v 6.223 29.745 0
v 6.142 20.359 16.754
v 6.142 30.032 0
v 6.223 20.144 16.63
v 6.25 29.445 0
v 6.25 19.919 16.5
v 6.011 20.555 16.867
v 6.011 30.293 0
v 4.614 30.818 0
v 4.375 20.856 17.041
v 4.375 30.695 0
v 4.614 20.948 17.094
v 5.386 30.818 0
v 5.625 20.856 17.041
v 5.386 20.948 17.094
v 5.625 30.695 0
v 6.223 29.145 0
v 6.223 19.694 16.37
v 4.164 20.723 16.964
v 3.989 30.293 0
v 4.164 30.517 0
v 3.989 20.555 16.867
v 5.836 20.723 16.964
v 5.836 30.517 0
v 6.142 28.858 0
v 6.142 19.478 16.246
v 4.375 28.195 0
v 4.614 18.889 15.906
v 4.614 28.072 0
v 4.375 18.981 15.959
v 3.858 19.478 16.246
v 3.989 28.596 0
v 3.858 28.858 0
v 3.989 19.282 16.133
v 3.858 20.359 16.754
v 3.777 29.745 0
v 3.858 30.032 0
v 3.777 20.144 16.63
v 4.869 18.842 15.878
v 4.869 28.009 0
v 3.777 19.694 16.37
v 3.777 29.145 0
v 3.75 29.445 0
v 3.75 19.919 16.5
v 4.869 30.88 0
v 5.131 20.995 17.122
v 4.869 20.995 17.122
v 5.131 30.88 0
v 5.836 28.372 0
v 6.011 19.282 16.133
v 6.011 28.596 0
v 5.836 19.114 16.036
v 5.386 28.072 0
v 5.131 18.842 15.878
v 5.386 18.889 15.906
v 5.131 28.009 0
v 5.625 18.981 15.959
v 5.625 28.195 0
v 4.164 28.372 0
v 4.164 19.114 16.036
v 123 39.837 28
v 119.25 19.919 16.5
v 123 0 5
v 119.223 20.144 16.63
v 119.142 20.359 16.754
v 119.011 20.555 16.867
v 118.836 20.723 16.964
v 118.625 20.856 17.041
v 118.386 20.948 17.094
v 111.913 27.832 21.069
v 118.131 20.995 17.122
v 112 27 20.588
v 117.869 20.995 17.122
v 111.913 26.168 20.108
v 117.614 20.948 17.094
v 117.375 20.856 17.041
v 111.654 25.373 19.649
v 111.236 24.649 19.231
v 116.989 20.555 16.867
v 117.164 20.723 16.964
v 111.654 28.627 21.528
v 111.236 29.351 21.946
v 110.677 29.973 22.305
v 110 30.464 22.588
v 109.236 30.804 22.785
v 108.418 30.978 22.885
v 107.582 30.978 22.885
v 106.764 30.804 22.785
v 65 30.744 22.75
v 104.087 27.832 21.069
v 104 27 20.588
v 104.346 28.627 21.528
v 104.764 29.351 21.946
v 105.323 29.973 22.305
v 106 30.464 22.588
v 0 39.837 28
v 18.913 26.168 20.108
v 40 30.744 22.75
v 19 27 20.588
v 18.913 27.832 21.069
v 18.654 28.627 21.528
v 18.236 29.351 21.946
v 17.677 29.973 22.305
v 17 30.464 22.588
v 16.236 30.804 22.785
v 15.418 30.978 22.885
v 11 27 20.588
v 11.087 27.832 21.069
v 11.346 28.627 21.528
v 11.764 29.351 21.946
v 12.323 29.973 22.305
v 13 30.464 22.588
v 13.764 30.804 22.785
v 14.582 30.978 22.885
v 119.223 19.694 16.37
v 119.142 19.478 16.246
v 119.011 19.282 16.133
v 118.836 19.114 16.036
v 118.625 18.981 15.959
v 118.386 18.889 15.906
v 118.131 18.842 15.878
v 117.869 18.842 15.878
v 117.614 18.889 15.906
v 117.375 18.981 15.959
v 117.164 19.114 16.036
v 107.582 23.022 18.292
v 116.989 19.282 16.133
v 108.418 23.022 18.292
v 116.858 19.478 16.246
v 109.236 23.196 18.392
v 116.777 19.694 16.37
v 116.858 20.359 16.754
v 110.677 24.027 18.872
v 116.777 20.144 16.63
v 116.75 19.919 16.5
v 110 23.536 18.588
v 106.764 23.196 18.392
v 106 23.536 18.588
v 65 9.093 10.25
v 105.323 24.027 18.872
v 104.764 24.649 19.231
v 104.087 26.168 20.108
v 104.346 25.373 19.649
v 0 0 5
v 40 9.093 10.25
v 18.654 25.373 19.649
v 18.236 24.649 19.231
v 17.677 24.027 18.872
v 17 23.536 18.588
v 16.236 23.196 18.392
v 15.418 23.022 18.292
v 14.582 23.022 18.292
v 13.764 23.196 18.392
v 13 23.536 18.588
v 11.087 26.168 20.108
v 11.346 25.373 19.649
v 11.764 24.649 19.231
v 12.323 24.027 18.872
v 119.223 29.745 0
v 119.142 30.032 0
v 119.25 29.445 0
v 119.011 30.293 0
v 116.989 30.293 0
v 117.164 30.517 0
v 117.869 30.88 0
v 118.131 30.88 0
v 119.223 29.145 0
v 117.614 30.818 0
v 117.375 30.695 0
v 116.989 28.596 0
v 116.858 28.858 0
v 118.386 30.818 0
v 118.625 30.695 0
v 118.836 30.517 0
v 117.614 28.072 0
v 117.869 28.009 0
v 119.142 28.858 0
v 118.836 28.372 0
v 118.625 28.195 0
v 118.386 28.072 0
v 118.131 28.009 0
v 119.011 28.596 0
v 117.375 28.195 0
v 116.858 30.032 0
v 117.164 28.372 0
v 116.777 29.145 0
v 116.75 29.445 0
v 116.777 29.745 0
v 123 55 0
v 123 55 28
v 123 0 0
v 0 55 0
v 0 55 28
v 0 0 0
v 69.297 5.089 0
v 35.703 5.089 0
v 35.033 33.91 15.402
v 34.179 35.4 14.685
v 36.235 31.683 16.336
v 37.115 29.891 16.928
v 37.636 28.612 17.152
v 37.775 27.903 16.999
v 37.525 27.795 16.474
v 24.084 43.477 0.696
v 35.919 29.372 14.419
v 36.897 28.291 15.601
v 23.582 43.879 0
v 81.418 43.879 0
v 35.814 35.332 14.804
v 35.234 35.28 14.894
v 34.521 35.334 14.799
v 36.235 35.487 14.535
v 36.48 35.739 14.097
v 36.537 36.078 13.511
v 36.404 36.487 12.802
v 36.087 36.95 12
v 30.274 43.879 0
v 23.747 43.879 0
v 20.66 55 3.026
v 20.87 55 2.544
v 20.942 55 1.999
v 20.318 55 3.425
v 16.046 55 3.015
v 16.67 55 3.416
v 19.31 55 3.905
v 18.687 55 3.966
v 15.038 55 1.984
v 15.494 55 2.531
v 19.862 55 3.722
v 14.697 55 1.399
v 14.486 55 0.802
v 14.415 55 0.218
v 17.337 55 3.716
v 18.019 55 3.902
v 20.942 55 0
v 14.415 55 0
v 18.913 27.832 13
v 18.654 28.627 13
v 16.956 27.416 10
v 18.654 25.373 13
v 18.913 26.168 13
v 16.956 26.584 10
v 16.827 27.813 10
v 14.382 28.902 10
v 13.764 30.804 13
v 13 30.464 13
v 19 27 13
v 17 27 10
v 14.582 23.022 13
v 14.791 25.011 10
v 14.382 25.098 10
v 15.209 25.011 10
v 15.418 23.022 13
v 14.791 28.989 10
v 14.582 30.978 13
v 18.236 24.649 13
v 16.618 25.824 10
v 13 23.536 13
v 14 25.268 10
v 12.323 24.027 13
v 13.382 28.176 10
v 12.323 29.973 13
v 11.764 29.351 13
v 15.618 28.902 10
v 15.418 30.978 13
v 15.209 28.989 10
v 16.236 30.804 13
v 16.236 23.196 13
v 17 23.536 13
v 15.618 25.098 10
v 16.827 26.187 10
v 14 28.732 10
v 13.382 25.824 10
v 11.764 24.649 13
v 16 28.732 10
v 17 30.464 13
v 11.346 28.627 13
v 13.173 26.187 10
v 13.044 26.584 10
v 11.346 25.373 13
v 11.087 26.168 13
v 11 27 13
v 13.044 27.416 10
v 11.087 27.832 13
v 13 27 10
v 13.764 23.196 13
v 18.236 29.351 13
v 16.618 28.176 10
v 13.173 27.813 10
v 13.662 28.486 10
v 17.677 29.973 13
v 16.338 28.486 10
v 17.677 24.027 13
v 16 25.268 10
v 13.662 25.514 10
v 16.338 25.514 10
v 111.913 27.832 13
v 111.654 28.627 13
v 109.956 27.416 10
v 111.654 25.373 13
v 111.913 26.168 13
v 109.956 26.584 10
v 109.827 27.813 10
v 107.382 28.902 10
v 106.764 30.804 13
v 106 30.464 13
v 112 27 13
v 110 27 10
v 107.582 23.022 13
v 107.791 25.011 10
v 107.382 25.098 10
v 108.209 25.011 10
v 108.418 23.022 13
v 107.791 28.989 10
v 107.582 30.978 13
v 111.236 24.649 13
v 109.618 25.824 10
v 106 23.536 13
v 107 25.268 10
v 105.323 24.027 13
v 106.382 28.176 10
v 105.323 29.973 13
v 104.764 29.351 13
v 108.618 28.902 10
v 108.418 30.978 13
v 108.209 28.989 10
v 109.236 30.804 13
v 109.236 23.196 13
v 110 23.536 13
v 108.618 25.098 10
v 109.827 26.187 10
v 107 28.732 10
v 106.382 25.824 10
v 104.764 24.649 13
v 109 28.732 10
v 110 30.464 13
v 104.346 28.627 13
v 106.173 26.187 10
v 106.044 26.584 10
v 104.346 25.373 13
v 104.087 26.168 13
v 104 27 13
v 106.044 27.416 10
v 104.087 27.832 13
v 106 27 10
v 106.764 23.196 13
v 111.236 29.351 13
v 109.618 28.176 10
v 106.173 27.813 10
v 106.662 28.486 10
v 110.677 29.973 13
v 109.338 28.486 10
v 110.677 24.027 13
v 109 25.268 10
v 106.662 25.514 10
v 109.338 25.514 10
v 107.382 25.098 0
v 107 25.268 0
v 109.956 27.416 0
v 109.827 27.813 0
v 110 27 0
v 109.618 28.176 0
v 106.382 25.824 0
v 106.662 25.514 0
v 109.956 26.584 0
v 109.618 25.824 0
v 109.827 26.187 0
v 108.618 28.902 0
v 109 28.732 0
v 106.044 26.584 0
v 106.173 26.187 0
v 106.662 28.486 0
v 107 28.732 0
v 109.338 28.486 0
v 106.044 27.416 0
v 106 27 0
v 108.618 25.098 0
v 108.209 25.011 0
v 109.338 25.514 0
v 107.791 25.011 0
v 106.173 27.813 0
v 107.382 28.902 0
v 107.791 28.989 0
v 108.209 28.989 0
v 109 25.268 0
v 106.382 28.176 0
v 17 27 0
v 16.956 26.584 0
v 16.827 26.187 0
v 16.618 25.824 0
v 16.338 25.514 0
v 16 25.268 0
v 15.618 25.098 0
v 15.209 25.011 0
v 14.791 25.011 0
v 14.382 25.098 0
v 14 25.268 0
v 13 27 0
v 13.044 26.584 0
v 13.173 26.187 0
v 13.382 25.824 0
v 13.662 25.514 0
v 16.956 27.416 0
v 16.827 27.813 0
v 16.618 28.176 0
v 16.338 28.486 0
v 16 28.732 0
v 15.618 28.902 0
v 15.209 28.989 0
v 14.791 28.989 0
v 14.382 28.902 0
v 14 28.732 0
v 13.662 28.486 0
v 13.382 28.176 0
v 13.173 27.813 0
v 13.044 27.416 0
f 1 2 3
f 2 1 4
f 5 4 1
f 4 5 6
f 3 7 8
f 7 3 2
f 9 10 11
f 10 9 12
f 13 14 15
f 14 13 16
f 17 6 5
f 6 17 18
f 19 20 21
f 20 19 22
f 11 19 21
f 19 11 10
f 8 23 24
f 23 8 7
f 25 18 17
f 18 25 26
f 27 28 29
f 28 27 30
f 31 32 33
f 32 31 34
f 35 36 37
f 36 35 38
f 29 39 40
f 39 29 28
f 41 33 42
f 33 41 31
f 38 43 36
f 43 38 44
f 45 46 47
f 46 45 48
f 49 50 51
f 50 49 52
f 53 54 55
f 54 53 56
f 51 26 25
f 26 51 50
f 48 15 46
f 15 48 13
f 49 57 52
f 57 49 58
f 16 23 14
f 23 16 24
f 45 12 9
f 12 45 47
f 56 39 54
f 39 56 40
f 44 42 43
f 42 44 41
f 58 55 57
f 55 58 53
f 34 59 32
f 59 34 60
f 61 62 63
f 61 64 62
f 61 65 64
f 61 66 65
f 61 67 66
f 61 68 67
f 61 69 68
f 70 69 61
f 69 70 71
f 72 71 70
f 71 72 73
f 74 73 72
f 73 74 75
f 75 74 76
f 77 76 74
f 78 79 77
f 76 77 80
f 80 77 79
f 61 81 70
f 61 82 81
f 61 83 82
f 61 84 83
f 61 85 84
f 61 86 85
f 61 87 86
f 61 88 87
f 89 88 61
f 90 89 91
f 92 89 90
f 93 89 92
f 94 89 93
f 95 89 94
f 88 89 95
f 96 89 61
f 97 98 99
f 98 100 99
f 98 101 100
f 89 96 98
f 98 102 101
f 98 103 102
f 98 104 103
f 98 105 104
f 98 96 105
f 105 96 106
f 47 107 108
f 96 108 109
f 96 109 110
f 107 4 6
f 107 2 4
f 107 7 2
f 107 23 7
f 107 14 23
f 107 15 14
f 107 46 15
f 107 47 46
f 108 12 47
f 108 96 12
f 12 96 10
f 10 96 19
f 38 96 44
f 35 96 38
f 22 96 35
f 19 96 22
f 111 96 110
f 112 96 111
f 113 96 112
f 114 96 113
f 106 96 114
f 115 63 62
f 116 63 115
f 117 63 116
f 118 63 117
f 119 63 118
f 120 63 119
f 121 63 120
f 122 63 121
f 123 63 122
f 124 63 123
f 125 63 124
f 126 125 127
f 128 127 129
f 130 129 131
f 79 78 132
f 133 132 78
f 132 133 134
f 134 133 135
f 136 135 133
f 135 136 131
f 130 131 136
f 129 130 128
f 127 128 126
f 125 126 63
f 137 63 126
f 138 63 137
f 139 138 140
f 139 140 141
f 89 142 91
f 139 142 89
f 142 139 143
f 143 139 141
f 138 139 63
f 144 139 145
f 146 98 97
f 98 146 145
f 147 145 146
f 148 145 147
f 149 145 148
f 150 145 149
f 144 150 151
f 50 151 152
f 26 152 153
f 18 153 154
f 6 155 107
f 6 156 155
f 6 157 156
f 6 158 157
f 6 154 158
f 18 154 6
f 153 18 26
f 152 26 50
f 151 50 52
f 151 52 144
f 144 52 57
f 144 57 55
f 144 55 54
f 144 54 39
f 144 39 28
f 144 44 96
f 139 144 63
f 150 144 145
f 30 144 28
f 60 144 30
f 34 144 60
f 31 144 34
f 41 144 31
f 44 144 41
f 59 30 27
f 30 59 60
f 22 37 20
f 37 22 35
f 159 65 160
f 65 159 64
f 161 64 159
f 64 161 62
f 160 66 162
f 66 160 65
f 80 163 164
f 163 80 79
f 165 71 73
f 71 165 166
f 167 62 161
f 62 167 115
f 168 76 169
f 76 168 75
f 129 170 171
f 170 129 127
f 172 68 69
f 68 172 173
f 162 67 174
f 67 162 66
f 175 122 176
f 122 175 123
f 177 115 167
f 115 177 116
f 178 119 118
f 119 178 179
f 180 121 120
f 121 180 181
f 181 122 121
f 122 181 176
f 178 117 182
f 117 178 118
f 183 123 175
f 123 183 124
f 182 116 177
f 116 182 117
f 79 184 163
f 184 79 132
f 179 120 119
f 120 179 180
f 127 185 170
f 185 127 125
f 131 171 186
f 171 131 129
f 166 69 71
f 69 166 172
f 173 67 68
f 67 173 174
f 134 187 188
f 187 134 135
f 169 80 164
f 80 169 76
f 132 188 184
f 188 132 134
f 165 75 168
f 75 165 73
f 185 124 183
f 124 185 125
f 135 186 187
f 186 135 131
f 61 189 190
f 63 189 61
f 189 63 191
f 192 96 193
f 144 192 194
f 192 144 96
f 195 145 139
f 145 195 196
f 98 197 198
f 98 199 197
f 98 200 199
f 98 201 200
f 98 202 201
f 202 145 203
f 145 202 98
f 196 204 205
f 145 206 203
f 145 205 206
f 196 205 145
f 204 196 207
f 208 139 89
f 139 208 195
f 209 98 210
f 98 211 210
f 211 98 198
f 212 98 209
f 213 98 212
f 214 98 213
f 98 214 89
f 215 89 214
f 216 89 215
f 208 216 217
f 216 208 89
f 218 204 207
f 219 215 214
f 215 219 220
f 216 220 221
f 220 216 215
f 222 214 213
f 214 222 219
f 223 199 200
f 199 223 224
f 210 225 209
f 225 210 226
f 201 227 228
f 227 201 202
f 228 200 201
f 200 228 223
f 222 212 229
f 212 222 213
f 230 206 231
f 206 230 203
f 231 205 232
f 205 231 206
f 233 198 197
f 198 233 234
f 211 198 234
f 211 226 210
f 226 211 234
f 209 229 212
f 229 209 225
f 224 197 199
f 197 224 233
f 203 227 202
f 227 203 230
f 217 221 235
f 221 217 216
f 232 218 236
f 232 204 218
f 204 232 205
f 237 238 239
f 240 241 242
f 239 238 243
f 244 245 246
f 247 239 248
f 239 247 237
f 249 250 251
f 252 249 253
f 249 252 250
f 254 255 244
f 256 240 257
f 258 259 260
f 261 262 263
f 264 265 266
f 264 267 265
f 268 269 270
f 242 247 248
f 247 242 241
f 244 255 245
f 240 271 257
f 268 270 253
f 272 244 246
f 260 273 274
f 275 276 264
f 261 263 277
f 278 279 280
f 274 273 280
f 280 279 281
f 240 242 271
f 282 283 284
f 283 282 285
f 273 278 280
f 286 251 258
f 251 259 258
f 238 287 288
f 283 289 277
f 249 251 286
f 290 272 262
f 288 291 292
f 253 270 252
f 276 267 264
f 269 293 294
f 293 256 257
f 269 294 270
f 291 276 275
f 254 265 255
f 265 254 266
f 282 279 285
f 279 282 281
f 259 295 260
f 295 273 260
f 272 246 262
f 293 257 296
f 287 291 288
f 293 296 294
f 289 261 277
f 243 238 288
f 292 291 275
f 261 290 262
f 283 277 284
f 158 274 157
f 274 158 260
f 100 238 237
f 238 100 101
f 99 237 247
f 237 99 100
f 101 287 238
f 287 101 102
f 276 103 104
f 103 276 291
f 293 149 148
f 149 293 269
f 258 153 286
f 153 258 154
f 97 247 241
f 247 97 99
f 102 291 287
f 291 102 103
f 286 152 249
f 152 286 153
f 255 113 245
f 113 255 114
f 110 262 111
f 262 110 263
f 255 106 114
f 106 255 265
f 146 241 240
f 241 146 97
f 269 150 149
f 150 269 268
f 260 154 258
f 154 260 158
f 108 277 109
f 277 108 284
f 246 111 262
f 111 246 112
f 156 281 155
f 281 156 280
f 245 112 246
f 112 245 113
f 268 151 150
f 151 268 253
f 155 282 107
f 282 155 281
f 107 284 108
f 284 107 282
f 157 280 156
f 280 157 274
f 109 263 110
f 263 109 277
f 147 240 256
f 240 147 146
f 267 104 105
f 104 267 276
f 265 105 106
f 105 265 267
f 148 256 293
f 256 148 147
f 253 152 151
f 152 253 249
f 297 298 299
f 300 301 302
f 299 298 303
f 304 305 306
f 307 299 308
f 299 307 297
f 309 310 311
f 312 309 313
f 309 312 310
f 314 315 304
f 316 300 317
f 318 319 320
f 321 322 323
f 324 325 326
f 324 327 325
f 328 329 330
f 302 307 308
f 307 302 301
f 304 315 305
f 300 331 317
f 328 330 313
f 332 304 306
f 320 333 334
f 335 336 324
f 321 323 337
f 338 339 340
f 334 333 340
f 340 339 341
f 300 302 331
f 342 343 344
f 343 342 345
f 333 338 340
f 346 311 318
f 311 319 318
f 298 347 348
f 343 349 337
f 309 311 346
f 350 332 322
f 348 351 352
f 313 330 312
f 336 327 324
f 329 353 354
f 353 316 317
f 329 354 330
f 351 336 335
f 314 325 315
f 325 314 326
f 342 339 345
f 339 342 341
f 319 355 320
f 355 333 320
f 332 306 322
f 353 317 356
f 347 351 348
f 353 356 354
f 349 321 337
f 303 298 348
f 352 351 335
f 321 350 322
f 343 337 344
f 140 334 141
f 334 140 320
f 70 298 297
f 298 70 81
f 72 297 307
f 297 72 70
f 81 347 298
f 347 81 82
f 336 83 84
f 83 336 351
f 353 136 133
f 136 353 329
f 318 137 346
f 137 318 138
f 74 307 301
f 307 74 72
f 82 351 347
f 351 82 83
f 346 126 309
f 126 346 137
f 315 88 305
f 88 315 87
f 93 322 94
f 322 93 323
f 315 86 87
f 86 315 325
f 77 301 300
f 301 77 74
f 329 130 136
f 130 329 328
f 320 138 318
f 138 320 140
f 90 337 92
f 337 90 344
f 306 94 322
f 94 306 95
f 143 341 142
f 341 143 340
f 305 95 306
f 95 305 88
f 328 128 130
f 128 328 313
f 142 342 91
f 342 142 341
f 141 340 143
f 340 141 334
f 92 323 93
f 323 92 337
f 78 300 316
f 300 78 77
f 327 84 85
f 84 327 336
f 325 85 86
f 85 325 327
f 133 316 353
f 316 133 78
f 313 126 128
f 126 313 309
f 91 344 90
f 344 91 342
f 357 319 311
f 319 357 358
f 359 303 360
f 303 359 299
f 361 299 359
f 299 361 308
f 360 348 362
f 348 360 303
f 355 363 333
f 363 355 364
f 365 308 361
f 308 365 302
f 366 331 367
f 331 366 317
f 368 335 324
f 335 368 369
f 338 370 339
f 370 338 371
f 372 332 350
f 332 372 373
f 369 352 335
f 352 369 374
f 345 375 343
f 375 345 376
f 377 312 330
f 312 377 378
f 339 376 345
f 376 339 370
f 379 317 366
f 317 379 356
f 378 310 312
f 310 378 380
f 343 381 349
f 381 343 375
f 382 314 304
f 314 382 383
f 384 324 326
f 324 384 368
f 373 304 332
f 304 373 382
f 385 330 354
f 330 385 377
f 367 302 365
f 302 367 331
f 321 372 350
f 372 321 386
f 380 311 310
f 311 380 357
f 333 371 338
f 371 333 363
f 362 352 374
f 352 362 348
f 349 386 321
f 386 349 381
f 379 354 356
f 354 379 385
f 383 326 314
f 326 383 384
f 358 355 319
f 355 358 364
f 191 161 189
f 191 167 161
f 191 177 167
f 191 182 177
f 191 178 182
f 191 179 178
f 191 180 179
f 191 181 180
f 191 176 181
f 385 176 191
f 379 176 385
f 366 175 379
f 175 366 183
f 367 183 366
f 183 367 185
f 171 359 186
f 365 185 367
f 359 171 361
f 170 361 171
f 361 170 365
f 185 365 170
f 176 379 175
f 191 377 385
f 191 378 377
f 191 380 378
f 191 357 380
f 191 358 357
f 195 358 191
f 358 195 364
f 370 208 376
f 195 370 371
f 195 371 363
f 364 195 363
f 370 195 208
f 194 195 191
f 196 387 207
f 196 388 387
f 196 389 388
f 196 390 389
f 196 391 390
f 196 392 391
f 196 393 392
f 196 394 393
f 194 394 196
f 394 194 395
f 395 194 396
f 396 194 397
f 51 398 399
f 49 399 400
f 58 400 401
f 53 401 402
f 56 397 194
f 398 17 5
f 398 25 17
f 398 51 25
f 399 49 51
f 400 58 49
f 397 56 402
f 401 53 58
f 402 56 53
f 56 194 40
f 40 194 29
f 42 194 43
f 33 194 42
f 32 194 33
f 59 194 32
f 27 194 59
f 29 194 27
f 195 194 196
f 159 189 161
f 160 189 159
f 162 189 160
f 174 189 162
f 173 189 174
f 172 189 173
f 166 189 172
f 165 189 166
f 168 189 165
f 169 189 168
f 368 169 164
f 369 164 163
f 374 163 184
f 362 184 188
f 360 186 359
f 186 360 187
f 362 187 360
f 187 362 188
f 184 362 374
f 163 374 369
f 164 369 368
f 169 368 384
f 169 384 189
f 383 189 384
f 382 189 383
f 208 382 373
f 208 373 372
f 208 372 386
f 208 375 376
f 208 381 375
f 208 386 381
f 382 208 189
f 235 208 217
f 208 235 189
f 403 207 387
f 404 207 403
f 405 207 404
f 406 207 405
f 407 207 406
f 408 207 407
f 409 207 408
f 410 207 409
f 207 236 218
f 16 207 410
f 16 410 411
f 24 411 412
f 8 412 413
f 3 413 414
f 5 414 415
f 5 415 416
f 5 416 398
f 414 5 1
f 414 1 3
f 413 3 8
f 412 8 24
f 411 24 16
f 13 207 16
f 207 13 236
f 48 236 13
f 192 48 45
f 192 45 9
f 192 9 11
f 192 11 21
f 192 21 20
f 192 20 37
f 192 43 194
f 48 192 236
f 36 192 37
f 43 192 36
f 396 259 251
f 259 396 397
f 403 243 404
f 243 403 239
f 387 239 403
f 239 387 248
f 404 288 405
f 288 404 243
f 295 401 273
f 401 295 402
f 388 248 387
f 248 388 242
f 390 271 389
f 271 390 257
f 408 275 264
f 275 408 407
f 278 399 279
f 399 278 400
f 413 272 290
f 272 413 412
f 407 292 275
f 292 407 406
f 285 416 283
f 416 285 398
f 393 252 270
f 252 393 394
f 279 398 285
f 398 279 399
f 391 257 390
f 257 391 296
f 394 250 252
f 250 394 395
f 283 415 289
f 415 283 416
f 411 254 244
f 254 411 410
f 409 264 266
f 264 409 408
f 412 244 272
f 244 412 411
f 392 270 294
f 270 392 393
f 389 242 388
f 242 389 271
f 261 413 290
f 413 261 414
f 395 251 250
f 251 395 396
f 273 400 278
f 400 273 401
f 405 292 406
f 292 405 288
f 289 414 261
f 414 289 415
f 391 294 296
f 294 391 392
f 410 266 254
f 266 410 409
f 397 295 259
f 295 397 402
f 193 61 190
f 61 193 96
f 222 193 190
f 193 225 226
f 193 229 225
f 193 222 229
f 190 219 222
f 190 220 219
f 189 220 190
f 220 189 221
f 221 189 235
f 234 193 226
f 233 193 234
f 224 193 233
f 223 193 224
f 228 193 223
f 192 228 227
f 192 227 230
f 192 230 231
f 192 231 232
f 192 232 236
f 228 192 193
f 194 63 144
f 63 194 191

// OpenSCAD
$fs = 0.01;
difference() {
    //base
cube([123,55,28]);
translate([0,0,5]) rotate([30,0,0]) 
    { 
        //bell 
        cube([123,46,28]);
        // screw holes bell
        translate([5,23,-50]) {
            cylinder(50,d=2.5);     
            translate([113,0,0]) cylinder(50,d=2.5);
        }
        
        // wire hole
        translate([40,(46/2)-(25/2),-30])  
        translate([25/2,25,30]) rotate([180,0,0]) linear_extrude(height=30,scale=2.5) translate([-25/2,0,0]) square([25,25]); 
    
        //cube([15,25,25]);

    }
    // wire guide
    translate([16,57,0]) rotate([67,0,40]) {
        cylinder(45, d=5);
        translate([-2.5,-50,0]) cube([5,50,45]);
    }
  translate([15,27,0]) {
   {    cylinder(10,d=4);     
        translate([0,0,10]) { 
            linear_extrude(height= 3, scale=2) circle(r = 2);
            translate([0,0,3]) cylinder(20, d= 8);
        }
   }
   
   translate([93,0,0]) 
   {    cylinder(10,d=4);     
        translate([0,0,10]) { 
            linear_extrude(height= 3, scale=2) circle(r = 2);
            translate([0,0,3]) cylinder(20, d= 8);
        }
   }
}
}
//translate([0,0,5]) rotate([30,0,0]) color([0,0,1]) cube([123,46,28]);
